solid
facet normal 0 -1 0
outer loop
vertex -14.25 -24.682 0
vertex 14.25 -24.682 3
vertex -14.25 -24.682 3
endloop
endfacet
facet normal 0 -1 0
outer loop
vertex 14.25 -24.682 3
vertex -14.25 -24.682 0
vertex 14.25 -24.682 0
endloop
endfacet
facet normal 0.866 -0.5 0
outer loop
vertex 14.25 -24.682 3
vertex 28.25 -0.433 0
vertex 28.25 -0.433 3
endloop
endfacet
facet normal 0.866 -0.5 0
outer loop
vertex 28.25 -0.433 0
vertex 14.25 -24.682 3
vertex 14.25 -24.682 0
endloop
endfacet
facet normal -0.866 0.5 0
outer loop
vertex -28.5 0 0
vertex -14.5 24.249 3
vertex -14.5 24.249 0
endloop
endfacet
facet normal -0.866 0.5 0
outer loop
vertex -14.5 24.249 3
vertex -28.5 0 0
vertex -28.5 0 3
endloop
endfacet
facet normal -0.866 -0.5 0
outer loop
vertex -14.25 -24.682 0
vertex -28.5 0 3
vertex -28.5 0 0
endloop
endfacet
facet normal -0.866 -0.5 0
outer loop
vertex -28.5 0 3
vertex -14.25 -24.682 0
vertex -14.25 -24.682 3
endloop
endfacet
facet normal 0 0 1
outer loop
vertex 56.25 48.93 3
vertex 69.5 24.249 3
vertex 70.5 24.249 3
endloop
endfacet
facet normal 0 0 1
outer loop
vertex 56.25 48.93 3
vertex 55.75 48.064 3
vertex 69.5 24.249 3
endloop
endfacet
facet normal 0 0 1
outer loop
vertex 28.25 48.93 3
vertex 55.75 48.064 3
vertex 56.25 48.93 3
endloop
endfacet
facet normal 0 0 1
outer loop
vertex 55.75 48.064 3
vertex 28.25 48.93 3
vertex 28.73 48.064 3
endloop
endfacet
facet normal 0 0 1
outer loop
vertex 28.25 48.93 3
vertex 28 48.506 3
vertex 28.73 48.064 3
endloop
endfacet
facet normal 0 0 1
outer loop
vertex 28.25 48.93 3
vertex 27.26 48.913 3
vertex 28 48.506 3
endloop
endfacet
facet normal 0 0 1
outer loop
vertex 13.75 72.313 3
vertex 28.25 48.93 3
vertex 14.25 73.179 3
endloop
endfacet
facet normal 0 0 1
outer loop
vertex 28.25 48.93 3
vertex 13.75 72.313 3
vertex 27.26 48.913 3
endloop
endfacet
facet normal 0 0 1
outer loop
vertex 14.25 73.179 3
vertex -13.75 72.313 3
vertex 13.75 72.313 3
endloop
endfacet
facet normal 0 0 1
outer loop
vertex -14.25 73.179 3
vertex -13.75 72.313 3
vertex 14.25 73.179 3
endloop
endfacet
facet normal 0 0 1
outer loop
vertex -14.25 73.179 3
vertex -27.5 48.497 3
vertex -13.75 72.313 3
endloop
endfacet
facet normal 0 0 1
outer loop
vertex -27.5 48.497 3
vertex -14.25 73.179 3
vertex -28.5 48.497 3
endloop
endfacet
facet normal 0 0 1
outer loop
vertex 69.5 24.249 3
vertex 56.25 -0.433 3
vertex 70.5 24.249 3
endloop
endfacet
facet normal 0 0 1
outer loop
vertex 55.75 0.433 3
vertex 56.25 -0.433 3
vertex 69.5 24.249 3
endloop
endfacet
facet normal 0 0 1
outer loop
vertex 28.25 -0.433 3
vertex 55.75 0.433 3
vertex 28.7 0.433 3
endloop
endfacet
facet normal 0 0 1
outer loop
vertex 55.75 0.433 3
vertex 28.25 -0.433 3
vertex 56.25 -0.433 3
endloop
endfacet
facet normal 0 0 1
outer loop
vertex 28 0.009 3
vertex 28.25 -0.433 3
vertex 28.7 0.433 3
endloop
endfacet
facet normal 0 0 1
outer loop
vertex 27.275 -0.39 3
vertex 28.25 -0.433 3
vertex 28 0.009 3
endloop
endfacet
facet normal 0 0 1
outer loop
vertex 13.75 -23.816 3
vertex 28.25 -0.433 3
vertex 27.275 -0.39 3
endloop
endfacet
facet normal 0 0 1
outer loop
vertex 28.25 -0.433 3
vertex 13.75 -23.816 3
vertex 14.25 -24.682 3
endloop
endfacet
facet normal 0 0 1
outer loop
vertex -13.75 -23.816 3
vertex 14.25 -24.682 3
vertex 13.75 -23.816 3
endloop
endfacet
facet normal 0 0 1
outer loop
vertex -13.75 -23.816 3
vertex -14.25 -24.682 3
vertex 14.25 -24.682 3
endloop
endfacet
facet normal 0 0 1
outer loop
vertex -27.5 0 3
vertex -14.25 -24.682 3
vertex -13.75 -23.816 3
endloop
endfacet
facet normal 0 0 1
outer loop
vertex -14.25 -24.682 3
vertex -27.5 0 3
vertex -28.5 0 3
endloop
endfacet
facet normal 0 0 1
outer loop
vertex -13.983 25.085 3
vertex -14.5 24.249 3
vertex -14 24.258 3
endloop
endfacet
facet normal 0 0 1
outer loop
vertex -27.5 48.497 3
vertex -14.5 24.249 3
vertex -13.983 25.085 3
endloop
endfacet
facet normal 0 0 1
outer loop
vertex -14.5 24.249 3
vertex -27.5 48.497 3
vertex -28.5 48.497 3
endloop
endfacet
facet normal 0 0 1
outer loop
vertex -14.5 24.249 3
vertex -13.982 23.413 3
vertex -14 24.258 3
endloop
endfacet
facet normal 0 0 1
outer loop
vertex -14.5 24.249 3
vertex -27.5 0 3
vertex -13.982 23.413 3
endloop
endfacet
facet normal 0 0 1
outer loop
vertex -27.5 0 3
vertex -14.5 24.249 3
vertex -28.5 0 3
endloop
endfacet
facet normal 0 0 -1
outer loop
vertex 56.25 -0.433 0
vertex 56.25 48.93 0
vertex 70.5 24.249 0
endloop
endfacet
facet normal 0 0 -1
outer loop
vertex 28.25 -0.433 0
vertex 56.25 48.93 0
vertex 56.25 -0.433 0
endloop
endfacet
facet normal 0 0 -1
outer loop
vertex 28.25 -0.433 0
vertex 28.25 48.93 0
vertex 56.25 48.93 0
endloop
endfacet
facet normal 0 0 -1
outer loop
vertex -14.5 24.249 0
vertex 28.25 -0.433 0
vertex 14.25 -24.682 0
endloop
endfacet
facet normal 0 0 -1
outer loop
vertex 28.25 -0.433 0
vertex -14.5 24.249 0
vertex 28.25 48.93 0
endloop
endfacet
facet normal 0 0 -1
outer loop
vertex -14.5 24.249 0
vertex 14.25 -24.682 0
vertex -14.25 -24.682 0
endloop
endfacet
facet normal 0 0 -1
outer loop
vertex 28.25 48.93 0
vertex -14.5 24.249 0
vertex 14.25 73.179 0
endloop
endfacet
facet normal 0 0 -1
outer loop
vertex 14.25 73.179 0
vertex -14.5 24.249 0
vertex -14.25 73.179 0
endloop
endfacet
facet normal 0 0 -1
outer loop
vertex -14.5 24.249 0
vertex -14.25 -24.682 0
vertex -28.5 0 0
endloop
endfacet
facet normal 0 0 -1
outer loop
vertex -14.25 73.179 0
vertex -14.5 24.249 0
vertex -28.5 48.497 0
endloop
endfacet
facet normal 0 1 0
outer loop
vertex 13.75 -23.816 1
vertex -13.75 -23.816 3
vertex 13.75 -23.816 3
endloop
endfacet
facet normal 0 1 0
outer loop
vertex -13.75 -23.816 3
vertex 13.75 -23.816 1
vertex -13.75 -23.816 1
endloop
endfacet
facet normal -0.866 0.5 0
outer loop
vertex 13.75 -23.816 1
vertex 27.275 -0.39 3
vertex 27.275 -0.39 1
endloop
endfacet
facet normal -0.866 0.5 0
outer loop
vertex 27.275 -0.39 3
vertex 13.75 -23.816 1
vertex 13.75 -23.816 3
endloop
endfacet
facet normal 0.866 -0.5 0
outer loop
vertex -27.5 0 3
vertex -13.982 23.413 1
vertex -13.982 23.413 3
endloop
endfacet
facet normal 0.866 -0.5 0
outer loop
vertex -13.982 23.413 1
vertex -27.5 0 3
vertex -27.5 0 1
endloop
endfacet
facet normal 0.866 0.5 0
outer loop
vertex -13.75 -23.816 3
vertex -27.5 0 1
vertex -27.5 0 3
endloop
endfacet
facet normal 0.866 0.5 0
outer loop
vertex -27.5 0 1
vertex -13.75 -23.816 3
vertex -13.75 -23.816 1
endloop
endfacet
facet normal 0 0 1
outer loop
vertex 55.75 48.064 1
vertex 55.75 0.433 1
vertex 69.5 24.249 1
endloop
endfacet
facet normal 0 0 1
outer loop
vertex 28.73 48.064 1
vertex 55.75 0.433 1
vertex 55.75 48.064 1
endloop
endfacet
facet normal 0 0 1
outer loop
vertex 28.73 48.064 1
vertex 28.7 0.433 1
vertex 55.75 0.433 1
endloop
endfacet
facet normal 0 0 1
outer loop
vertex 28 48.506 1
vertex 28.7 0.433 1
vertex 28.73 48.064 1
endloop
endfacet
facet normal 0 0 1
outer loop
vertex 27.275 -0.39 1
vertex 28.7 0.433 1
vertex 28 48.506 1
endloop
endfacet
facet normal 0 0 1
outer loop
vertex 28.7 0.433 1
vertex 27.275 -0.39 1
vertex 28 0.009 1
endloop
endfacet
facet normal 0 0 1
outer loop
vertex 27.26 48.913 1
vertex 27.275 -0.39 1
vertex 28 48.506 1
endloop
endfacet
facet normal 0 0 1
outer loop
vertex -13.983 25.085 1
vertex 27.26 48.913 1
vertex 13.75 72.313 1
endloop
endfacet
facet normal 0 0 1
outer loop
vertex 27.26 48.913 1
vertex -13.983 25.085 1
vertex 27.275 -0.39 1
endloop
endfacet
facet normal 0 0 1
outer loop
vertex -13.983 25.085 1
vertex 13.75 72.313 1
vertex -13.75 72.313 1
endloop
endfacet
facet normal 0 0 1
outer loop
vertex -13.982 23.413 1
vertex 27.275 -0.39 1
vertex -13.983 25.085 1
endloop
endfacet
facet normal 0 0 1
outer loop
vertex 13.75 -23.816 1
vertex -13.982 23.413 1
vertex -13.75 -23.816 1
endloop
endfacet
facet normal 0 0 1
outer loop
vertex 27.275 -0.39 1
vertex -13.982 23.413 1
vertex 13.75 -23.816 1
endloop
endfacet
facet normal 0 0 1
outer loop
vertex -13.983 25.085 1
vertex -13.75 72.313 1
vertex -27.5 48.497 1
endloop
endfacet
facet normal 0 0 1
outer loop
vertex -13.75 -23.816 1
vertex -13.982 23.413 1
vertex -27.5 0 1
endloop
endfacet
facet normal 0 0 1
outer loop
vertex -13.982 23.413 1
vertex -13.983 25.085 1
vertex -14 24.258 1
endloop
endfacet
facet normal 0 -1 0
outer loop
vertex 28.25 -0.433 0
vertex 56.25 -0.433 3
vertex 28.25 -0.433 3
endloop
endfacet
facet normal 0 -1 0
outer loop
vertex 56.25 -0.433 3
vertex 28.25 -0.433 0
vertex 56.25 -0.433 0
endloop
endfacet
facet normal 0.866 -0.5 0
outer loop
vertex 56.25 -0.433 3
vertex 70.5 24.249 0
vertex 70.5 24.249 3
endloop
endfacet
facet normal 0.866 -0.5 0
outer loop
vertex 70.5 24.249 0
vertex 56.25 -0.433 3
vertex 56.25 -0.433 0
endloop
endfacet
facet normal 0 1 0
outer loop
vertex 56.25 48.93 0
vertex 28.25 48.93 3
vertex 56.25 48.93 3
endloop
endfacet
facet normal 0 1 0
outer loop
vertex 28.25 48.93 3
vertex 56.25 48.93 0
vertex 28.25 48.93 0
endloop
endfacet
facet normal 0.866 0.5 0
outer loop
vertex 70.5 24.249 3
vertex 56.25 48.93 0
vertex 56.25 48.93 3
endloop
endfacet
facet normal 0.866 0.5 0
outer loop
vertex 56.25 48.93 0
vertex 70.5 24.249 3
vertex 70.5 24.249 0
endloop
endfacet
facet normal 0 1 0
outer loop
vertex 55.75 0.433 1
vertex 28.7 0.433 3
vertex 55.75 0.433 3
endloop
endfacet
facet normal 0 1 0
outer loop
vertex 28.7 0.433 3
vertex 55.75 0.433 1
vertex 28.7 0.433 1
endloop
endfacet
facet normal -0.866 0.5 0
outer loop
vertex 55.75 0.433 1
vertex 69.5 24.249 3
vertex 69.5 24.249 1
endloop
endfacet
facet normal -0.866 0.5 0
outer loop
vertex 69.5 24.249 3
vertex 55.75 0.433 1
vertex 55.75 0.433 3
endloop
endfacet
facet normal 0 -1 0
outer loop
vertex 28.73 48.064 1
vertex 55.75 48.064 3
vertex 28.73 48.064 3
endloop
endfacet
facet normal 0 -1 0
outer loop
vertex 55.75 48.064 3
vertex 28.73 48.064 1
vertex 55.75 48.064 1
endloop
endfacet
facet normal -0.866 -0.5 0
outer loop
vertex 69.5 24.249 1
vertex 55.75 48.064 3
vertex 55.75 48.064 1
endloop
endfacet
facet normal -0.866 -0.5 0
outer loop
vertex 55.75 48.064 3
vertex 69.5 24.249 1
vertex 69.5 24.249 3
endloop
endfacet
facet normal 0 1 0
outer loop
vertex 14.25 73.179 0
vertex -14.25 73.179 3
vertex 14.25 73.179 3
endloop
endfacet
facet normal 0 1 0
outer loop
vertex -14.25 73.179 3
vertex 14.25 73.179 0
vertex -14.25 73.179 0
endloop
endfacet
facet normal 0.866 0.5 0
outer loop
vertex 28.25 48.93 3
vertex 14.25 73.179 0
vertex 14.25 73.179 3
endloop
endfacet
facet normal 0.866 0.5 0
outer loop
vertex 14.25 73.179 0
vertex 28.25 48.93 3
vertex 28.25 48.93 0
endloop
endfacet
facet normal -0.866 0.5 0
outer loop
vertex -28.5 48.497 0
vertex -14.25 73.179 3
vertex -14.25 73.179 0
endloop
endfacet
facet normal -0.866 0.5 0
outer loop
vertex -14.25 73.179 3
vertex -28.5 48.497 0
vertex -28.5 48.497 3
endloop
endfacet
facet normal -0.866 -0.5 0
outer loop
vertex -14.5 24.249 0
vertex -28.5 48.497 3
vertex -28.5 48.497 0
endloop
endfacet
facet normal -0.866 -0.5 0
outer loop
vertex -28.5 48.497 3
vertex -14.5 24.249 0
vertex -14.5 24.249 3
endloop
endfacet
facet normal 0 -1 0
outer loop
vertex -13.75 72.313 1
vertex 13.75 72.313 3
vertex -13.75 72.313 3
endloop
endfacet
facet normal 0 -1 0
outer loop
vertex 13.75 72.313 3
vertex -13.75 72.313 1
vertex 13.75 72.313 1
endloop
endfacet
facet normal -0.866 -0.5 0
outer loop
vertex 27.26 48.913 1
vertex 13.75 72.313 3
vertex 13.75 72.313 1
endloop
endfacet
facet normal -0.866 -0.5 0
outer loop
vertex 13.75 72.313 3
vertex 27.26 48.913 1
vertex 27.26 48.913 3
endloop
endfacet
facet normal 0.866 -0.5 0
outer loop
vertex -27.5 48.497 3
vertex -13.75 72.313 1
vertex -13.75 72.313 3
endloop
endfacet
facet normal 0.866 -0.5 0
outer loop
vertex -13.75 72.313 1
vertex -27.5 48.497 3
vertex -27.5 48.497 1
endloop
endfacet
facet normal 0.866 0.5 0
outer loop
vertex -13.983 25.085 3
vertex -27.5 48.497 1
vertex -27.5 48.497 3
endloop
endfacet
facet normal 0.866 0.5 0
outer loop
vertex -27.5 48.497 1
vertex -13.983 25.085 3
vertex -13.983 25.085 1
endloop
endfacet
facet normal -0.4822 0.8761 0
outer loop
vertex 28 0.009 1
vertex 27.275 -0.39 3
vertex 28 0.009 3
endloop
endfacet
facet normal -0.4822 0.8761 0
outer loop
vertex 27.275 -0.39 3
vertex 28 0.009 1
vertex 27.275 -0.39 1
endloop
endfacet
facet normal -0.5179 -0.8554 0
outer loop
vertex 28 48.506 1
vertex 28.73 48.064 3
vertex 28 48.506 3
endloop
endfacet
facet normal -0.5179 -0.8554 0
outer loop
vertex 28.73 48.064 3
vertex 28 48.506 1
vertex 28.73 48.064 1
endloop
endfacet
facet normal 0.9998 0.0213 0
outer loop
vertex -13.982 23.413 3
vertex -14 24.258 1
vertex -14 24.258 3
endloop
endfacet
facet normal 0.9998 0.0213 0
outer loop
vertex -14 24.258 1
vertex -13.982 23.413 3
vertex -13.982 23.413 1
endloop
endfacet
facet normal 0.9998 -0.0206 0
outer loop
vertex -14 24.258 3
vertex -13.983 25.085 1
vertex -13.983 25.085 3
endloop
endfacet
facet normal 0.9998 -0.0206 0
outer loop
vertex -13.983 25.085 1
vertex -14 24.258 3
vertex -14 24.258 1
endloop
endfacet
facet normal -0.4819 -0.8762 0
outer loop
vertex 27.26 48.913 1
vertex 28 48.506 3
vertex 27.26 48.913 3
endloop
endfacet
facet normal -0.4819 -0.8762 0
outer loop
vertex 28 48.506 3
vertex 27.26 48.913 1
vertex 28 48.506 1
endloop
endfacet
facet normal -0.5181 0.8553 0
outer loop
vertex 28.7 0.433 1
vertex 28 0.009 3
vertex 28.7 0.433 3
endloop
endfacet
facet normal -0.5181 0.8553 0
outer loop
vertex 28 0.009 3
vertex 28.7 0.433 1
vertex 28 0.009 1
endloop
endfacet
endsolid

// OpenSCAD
$fn = 150;

difference() {
	union() {
		translate(v = [0.0, 0.0, 0]) {
			difference() {
				cylinder($fn = 6, d = 57.0, h = 3.0);
				translate(v = [0, 0, 1.0]) {
					cylinder($fn = 6, d = 55.0, h = 3.0);
				}
			}
		}
		translate(v = [42.0, 24.24871130596428, 0]) {
			difference() {
				cylinder($fn = 6, d = 57.0, h = 3.0);
				translate(v = [0, 0, 1.0]) {
					cylinder($fn = 6, d = 55.0, h = 3.0);
				}
			}
		}
		translate(v = [0.0, 48.49742261192856, 0]) {
			difference() {
				cylinder($fn = 6, d = 57.0, h = 3.0);
				translate(v = [0, 0, 1.0]) {
					cylinder($fn = 6, d = 55.0, h = 3.0);
				}
			}
		}
	}
	translate(v = [14.0, 24.25768590217984, 1.0]) {
		cylinder(d = 56.0, h = 3.5);
	}
}
